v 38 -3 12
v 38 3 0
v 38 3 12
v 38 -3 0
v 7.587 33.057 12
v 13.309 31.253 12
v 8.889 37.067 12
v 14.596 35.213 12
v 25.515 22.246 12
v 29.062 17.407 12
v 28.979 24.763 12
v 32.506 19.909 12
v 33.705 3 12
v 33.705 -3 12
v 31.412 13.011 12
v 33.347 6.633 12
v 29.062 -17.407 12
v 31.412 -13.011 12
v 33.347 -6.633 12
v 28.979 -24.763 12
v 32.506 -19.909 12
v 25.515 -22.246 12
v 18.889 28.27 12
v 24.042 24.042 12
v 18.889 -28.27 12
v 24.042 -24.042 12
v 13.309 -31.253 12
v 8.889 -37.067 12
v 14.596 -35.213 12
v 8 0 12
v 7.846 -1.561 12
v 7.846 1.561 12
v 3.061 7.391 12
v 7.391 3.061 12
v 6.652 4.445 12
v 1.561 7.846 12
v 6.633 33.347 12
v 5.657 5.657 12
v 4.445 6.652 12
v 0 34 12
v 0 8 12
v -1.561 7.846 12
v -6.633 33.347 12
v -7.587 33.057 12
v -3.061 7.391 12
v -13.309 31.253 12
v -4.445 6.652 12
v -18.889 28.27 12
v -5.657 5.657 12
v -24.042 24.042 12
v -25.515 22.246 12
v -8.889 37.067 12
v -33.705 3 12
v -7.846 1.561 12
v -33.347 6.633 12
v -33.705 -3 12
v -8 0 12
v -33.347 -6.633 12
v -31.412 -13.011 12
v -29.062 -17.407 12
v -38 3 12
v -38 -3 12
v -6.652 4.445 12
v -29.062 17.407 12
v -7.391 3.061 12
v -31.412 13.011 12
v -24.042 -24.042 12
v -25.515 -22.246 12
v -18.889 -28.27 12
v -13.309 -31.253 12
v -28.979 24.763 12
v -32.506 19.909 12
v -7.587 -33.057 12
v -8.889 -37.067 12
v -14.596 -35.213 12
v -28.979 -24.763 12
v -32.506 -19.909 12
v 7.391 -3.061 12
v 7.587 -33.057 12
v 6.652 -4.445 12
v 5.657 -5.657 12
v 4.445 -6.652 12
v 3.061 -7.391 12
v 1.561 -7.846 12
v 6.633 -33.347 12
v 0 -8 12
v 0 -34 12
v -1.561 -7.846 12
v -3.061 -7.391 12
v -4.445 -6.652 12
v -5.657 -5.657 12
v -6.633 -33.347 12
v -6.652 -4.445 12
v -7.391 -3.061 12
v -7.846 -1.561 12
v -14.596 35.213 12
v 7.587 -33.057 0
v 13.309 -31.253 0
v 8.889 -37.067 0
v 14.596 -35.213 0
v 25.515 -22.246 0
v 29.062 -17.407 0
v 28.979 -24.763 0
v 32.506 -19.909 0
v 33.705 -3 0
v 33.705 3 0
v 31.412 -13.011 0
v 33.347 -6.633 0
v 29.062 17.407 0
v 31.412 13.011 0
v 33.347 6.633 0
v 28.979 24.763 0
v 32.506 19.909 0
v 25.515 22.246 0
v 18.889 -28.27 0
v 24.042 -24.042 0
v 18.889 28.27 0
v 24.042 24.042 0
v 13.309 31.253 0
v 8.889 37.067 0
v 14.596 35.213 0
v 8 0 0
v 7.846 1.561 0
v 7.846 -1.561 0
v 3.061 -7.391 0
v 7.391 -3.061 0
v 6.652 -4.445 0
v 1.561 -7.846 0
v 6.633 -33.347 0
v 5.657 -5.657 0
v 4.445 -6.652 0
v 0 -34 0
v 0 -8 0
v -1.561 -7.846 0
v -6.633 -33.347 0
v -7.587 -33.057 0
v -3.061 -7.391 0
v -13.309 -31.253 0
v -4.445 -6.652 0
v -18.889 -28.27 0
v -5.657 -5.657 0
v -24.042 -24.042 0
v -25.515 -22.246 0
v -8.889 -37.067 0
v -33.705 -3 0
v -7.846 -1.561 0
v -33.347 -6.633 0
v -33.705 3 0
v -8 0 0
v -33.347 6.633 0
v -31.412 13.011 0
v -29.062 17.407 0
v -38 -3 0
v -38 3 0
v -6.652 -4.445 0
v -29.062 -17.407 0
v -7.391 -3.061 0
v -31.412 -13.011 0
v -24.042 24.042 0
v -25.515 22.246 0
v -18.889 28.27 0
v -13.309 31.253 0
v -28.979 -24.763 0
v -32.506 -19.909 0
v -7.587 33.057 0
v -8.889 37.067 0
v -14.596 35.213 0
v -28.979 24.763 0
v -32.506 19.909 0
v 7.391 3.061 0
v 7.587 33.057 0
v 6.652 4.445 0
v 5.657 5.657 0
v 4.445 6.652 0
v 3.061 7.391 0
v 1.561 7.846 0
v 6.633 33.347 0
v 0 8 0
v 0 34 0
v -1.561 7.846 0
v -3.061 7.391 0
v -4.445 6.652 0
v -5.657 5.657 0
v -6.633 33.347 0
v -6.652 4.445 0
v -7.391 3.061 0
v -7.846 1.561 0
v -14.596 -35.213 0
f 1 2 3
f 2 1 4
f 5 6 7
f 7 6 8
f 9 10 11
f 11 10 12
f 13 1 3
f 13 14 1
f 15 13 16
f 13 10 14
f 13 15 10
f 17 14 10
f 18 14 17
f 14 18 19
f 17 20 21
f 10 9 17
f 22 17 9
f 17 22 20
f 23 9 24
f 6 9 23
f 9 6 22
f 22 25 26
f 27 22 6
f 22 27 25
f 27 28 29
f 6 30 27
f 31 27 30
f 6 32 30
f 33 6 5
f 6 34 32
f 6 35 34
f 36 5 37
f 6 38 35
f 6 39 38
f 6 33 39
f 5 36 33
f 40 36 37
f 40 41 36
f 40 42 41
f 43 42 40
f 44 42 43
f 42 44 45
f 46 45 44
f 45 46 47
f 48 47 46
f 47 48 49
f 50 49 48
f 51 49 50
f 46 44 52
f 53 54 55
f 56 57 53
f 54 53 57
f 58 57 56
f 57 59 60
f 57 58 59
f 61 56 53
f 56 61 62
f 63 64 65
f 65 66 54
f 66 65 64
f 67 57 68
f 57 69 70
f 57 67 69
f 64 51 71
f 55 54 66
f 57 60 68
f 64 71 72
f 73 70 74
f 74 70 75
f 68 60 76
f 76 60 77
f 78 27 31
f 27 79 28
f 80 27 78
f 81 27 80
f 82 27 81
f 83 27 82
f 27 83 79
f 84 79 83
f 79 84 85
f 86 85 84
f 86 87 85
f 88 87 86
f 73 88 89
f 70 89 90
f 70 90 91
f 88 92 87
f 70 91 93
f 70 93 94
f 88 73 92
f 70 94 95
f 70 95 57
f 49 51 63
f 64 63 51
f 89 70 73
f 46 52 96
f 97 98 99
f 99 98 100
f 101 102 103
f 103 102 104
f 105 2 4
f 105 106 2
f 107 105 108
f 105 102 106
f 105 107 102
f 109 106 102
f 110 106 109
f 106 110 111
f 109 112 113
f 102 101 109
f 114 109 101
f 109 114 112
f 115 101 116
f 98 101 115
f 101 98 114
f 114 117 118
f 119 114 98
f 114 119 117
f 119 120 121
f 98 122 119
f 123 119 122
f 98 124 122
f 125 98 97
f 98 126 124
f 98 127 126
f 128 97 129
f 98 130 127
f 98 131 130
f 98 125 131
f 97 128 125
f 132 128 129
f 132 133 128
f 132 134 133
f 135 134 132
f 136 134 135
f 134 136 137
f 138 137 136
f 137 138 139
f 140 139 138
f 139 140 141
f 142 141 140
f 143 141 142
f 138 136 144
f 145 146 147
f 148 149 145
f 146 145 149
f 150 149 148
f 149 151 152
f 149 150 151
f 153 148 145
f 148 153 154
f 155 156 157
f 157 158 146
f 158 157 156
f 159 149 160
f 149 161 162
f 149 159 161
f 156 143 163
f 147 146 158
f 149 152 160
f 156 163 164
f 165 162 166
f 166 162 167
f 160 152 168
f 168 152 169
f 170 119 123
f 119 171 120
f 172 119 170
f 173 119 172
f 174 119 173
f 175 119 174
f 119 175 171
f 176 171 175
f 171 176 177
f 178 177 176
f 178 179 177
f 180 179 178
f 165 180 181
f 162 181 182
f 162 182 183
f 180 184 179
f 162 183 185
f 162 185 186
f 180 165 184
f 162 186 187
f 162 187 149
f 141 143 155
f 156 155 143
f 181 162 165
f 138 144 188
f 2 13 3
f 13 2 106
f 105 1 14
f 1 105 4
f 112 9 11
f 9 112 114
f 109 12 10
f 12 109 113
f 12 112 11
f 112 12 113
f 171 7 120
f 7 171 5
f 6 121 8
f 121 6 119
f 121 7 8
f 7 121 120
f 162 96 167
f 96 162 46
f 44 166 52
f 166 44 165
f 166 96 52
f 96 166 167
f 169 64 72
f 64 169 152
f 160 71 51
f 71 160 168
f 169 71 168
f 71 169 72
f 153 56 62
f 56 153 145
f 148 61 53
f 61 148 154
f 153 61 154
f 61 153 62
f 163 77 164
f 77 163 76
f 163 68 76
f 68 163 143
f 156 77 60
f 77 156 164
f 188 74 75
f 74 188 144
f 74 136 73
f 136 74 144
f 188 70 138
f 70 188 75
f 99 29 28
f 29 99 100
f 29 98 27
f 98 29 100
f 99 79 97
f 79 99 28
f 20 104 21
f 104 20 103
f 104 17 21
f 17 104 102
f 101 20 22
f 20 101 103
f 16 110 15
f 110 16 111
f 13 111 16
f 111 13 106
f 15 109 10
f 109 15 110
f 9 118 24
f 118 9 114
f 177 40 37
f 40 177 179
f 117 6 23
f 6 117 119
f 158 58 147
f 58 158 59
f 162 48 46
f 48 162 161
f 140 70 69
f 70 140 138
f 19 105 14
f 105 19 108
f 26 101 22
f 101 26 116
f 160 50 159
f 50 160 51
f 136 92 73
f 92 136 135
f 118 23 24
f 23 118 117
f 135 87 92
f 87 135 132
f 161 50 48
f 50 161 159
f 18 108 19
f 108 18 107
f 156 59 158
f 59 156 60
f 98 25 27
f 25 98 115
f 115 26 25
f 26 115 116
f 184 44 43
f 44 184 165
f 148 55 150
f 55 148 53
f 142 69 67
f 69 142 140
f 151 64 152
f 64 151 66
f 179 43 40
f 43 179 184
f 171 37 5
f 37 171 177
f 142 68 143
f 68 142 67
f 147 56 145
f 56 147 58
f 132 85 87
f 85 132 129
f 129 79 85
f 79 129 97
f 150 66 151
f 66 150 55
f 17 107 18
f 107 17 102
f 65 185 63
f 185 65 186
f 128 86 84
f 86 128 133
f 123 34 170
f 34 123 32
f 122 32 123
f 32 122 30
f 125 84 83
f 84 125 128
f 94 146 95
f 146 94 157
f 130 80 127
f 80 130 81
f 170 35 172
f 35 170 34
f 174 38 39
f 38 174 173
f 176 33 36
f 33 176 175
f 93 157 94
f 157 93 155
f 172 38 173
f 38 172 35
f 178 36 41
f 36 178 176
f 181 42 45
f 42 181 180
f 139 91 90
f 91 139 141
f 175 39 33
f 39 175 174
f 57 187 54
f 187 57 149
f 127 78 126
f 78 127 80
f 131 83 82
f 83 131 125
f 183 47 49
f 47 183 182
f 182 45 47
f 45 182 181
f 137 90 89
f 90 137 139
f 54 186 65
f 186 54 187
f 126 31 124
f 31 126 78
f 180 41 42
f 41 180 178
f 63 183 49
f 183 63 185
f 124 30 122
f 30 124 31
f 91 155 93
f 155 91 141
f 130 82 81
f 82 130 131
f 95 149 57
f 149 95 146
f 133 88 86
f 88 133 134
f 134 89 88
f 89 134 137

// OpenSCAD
$fn = 32;

// ----------------------------------------------------------------------
// Spur blank: bored gear blank
// ----------------------------------------------------------------------

// --- parameters (mm) ---
disc_r = 34;              // blank root radius
disc_t = 12;              // blank thickness
n_teeth = 10;             // stub tooth count
tooth_w = 6;              // tooth width at the root
tooth_h = 4;              // tooth height above the root
bore_r = 8;               // central bore radius

out_r = disc_r + tooth_h;  // tip radius
bbox_x = 76.0;  // measured width over the teeth
bbox_y = 74.13;  // measured depth over the teeth

difference() {
union() {
  cylinder(r = disc_r, h = disc_t);
  for (i = [0 : n_teeth - 1])
    rotate([0, 0, i * 360 / n_teeth])
      translate([disc_r - 1, -tooth_w / 2, 0])
        cube([tooth_h + 1, tooth_w, disc_t]);
}
  translate([0, 0, -1]) cylinder(r = bore_r, h = disc_t + 2);
}
